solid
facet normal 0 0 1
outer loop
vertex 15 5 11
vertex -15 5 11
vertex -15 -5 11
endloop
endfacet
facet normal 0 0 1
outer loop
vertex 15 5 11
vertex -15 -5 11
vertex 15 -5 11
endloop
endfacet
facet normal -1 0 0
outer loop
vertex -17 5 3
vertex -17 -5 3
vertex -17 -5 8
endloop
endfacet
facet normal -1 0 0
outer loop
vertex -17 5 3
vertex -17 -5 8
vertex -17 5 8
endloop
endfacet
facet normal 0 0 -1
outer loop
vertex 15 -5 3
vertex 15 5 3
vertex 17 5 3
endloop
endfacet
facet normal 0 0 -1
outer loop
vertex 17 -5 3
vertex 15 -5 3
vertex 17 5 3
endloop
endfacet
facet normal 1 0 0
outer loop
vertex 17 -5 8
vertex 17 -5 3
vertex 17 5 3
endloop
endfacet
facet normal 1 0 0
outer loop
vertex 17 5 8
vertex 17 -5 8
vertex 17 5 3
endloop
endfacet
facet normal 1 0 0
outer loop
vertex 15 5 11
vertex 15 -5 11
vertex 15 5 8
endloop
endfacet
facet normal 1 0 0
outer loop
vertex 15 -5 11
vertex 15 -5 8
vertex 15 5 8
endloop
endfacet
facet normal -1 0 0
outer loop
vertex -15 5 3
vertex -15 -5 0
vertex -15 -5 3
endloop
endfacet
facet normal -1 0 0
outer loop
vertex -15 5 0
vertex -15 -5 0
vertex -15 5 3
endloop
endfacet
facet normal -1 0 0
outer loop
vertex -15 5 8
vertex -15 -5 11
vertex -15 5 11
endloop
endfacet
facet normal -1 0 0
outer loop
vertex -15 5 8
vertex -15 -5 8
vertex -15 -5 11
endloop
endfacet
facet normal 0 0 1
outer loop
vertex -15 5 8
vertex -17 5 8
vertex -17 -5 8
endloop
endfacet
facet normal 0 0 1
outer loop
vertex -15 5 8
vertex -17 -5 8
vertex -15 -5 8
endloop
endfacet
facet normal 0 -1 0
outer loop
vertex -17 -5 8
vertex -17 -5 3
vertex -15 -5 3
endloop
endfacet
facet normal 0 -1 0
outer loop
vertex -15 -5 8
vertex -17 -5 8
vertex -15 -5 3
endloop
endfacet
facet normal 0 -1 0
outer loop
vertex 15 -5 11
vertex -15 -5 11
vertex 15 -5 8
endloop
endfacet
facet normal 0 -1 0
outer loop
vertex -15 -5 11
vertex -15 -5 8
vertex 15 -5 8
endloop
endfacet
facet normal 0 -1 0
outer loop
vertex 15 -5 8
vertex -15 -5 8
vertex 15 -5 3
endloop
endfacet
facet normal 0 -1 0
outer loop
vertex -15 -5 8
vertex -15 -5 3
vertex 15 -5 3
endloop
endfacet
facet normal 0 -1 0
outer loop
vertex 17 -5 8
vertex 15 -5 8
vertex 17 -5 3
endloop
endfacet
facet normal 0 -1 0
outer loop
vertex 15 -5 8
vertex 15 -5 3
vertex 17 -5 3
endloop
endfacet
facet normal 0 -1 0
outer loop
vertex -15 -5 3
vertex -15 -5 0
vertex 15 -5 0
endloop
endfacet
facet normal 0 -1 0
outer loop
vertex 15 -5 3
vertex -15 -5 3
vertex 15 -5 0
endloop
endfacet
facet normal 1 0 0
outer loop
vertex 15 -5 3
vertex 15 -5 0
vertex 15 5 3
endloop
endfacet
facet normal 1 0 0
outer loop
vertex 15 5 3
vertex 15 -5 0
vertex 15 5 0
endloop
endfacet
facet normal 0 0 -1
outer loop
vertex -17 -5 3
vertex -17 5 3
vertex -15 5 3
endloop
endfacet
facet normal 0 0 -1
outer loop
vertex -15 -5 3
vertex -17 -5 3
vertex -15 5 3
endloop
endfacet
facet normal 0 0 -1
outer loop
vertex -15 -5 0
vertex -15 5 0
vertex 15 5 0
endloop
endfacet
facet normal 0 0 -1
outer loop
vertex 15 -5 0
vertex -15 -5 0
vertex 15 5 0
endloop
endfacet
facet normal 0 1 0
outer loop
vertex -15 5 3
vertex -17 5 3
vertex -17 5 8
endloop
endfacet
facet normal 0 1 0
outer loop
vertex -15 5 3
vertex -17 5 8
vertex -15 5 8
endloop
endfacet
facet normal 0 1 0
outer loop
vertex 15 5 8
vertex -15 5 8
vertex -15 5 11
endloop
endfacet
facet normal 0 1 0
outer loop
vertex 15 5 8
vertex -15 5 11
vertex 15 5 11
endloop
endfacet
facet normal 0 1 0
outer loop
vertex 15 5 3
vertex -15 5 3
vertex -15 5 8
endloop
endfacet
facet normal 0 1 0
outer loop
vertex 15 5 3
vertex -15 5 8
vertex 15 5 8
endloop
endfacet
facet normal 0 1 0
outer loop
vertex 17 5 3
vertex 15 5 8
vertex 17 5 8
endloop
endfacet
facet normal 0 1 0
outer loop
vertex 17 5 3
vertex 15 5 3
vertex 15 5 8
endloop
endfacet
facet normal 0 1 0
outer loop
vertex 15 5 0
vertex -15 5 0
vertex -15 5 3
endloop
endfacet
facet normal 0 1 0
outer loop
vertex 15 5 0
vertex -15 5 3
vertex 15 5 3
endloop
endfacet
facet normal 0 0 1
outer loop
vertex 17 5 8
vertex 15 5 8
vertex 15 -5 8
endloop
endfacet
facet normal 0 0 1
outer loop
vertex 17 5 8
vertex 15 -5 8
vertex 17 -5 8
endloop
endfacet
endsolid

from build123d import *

# Parameters (mm, degrees)
F0_W     = 30
F0_H     = 10
F1_DEPTH = 3
F2_W     = 34
F2_H     = 10
F3_DEPTH = 5
F4_W     = 30
F4_H     = 10
F5_DEPTH = 2
F6_W     = 30
F6_H     = 10
F7_DEPTH = 1


with BuildPart() as f1:
    # F0 (on Top) → F1 (new body)
    with BuildSketch(Plane.XY):
        Rectangle(F0_W, F0_H)
    extrude(amount=F1_DEPTH)

    # F2 (on face) → F3 (join)
    with BuildSketch(Plane.XY.offset(3)):
        Rectangle(F2_W, F2_H)
    extrude(amount=F3_DEPTH)

    # F4 (on face) → F5 (join)
    with BuildSketch(Plane.XY.offset(8)):
        Rectangle(F4_W, F4_H)
    extrude(amount=F5_DEPTH)

    # F6 (on face) → F7 (join)
    with BuildSketch(Plane.XY.offset(10)):
        Rectangle(F6_W, F6_H)
    extrude(amount=F7_DEPTH)


solid = f1.part
